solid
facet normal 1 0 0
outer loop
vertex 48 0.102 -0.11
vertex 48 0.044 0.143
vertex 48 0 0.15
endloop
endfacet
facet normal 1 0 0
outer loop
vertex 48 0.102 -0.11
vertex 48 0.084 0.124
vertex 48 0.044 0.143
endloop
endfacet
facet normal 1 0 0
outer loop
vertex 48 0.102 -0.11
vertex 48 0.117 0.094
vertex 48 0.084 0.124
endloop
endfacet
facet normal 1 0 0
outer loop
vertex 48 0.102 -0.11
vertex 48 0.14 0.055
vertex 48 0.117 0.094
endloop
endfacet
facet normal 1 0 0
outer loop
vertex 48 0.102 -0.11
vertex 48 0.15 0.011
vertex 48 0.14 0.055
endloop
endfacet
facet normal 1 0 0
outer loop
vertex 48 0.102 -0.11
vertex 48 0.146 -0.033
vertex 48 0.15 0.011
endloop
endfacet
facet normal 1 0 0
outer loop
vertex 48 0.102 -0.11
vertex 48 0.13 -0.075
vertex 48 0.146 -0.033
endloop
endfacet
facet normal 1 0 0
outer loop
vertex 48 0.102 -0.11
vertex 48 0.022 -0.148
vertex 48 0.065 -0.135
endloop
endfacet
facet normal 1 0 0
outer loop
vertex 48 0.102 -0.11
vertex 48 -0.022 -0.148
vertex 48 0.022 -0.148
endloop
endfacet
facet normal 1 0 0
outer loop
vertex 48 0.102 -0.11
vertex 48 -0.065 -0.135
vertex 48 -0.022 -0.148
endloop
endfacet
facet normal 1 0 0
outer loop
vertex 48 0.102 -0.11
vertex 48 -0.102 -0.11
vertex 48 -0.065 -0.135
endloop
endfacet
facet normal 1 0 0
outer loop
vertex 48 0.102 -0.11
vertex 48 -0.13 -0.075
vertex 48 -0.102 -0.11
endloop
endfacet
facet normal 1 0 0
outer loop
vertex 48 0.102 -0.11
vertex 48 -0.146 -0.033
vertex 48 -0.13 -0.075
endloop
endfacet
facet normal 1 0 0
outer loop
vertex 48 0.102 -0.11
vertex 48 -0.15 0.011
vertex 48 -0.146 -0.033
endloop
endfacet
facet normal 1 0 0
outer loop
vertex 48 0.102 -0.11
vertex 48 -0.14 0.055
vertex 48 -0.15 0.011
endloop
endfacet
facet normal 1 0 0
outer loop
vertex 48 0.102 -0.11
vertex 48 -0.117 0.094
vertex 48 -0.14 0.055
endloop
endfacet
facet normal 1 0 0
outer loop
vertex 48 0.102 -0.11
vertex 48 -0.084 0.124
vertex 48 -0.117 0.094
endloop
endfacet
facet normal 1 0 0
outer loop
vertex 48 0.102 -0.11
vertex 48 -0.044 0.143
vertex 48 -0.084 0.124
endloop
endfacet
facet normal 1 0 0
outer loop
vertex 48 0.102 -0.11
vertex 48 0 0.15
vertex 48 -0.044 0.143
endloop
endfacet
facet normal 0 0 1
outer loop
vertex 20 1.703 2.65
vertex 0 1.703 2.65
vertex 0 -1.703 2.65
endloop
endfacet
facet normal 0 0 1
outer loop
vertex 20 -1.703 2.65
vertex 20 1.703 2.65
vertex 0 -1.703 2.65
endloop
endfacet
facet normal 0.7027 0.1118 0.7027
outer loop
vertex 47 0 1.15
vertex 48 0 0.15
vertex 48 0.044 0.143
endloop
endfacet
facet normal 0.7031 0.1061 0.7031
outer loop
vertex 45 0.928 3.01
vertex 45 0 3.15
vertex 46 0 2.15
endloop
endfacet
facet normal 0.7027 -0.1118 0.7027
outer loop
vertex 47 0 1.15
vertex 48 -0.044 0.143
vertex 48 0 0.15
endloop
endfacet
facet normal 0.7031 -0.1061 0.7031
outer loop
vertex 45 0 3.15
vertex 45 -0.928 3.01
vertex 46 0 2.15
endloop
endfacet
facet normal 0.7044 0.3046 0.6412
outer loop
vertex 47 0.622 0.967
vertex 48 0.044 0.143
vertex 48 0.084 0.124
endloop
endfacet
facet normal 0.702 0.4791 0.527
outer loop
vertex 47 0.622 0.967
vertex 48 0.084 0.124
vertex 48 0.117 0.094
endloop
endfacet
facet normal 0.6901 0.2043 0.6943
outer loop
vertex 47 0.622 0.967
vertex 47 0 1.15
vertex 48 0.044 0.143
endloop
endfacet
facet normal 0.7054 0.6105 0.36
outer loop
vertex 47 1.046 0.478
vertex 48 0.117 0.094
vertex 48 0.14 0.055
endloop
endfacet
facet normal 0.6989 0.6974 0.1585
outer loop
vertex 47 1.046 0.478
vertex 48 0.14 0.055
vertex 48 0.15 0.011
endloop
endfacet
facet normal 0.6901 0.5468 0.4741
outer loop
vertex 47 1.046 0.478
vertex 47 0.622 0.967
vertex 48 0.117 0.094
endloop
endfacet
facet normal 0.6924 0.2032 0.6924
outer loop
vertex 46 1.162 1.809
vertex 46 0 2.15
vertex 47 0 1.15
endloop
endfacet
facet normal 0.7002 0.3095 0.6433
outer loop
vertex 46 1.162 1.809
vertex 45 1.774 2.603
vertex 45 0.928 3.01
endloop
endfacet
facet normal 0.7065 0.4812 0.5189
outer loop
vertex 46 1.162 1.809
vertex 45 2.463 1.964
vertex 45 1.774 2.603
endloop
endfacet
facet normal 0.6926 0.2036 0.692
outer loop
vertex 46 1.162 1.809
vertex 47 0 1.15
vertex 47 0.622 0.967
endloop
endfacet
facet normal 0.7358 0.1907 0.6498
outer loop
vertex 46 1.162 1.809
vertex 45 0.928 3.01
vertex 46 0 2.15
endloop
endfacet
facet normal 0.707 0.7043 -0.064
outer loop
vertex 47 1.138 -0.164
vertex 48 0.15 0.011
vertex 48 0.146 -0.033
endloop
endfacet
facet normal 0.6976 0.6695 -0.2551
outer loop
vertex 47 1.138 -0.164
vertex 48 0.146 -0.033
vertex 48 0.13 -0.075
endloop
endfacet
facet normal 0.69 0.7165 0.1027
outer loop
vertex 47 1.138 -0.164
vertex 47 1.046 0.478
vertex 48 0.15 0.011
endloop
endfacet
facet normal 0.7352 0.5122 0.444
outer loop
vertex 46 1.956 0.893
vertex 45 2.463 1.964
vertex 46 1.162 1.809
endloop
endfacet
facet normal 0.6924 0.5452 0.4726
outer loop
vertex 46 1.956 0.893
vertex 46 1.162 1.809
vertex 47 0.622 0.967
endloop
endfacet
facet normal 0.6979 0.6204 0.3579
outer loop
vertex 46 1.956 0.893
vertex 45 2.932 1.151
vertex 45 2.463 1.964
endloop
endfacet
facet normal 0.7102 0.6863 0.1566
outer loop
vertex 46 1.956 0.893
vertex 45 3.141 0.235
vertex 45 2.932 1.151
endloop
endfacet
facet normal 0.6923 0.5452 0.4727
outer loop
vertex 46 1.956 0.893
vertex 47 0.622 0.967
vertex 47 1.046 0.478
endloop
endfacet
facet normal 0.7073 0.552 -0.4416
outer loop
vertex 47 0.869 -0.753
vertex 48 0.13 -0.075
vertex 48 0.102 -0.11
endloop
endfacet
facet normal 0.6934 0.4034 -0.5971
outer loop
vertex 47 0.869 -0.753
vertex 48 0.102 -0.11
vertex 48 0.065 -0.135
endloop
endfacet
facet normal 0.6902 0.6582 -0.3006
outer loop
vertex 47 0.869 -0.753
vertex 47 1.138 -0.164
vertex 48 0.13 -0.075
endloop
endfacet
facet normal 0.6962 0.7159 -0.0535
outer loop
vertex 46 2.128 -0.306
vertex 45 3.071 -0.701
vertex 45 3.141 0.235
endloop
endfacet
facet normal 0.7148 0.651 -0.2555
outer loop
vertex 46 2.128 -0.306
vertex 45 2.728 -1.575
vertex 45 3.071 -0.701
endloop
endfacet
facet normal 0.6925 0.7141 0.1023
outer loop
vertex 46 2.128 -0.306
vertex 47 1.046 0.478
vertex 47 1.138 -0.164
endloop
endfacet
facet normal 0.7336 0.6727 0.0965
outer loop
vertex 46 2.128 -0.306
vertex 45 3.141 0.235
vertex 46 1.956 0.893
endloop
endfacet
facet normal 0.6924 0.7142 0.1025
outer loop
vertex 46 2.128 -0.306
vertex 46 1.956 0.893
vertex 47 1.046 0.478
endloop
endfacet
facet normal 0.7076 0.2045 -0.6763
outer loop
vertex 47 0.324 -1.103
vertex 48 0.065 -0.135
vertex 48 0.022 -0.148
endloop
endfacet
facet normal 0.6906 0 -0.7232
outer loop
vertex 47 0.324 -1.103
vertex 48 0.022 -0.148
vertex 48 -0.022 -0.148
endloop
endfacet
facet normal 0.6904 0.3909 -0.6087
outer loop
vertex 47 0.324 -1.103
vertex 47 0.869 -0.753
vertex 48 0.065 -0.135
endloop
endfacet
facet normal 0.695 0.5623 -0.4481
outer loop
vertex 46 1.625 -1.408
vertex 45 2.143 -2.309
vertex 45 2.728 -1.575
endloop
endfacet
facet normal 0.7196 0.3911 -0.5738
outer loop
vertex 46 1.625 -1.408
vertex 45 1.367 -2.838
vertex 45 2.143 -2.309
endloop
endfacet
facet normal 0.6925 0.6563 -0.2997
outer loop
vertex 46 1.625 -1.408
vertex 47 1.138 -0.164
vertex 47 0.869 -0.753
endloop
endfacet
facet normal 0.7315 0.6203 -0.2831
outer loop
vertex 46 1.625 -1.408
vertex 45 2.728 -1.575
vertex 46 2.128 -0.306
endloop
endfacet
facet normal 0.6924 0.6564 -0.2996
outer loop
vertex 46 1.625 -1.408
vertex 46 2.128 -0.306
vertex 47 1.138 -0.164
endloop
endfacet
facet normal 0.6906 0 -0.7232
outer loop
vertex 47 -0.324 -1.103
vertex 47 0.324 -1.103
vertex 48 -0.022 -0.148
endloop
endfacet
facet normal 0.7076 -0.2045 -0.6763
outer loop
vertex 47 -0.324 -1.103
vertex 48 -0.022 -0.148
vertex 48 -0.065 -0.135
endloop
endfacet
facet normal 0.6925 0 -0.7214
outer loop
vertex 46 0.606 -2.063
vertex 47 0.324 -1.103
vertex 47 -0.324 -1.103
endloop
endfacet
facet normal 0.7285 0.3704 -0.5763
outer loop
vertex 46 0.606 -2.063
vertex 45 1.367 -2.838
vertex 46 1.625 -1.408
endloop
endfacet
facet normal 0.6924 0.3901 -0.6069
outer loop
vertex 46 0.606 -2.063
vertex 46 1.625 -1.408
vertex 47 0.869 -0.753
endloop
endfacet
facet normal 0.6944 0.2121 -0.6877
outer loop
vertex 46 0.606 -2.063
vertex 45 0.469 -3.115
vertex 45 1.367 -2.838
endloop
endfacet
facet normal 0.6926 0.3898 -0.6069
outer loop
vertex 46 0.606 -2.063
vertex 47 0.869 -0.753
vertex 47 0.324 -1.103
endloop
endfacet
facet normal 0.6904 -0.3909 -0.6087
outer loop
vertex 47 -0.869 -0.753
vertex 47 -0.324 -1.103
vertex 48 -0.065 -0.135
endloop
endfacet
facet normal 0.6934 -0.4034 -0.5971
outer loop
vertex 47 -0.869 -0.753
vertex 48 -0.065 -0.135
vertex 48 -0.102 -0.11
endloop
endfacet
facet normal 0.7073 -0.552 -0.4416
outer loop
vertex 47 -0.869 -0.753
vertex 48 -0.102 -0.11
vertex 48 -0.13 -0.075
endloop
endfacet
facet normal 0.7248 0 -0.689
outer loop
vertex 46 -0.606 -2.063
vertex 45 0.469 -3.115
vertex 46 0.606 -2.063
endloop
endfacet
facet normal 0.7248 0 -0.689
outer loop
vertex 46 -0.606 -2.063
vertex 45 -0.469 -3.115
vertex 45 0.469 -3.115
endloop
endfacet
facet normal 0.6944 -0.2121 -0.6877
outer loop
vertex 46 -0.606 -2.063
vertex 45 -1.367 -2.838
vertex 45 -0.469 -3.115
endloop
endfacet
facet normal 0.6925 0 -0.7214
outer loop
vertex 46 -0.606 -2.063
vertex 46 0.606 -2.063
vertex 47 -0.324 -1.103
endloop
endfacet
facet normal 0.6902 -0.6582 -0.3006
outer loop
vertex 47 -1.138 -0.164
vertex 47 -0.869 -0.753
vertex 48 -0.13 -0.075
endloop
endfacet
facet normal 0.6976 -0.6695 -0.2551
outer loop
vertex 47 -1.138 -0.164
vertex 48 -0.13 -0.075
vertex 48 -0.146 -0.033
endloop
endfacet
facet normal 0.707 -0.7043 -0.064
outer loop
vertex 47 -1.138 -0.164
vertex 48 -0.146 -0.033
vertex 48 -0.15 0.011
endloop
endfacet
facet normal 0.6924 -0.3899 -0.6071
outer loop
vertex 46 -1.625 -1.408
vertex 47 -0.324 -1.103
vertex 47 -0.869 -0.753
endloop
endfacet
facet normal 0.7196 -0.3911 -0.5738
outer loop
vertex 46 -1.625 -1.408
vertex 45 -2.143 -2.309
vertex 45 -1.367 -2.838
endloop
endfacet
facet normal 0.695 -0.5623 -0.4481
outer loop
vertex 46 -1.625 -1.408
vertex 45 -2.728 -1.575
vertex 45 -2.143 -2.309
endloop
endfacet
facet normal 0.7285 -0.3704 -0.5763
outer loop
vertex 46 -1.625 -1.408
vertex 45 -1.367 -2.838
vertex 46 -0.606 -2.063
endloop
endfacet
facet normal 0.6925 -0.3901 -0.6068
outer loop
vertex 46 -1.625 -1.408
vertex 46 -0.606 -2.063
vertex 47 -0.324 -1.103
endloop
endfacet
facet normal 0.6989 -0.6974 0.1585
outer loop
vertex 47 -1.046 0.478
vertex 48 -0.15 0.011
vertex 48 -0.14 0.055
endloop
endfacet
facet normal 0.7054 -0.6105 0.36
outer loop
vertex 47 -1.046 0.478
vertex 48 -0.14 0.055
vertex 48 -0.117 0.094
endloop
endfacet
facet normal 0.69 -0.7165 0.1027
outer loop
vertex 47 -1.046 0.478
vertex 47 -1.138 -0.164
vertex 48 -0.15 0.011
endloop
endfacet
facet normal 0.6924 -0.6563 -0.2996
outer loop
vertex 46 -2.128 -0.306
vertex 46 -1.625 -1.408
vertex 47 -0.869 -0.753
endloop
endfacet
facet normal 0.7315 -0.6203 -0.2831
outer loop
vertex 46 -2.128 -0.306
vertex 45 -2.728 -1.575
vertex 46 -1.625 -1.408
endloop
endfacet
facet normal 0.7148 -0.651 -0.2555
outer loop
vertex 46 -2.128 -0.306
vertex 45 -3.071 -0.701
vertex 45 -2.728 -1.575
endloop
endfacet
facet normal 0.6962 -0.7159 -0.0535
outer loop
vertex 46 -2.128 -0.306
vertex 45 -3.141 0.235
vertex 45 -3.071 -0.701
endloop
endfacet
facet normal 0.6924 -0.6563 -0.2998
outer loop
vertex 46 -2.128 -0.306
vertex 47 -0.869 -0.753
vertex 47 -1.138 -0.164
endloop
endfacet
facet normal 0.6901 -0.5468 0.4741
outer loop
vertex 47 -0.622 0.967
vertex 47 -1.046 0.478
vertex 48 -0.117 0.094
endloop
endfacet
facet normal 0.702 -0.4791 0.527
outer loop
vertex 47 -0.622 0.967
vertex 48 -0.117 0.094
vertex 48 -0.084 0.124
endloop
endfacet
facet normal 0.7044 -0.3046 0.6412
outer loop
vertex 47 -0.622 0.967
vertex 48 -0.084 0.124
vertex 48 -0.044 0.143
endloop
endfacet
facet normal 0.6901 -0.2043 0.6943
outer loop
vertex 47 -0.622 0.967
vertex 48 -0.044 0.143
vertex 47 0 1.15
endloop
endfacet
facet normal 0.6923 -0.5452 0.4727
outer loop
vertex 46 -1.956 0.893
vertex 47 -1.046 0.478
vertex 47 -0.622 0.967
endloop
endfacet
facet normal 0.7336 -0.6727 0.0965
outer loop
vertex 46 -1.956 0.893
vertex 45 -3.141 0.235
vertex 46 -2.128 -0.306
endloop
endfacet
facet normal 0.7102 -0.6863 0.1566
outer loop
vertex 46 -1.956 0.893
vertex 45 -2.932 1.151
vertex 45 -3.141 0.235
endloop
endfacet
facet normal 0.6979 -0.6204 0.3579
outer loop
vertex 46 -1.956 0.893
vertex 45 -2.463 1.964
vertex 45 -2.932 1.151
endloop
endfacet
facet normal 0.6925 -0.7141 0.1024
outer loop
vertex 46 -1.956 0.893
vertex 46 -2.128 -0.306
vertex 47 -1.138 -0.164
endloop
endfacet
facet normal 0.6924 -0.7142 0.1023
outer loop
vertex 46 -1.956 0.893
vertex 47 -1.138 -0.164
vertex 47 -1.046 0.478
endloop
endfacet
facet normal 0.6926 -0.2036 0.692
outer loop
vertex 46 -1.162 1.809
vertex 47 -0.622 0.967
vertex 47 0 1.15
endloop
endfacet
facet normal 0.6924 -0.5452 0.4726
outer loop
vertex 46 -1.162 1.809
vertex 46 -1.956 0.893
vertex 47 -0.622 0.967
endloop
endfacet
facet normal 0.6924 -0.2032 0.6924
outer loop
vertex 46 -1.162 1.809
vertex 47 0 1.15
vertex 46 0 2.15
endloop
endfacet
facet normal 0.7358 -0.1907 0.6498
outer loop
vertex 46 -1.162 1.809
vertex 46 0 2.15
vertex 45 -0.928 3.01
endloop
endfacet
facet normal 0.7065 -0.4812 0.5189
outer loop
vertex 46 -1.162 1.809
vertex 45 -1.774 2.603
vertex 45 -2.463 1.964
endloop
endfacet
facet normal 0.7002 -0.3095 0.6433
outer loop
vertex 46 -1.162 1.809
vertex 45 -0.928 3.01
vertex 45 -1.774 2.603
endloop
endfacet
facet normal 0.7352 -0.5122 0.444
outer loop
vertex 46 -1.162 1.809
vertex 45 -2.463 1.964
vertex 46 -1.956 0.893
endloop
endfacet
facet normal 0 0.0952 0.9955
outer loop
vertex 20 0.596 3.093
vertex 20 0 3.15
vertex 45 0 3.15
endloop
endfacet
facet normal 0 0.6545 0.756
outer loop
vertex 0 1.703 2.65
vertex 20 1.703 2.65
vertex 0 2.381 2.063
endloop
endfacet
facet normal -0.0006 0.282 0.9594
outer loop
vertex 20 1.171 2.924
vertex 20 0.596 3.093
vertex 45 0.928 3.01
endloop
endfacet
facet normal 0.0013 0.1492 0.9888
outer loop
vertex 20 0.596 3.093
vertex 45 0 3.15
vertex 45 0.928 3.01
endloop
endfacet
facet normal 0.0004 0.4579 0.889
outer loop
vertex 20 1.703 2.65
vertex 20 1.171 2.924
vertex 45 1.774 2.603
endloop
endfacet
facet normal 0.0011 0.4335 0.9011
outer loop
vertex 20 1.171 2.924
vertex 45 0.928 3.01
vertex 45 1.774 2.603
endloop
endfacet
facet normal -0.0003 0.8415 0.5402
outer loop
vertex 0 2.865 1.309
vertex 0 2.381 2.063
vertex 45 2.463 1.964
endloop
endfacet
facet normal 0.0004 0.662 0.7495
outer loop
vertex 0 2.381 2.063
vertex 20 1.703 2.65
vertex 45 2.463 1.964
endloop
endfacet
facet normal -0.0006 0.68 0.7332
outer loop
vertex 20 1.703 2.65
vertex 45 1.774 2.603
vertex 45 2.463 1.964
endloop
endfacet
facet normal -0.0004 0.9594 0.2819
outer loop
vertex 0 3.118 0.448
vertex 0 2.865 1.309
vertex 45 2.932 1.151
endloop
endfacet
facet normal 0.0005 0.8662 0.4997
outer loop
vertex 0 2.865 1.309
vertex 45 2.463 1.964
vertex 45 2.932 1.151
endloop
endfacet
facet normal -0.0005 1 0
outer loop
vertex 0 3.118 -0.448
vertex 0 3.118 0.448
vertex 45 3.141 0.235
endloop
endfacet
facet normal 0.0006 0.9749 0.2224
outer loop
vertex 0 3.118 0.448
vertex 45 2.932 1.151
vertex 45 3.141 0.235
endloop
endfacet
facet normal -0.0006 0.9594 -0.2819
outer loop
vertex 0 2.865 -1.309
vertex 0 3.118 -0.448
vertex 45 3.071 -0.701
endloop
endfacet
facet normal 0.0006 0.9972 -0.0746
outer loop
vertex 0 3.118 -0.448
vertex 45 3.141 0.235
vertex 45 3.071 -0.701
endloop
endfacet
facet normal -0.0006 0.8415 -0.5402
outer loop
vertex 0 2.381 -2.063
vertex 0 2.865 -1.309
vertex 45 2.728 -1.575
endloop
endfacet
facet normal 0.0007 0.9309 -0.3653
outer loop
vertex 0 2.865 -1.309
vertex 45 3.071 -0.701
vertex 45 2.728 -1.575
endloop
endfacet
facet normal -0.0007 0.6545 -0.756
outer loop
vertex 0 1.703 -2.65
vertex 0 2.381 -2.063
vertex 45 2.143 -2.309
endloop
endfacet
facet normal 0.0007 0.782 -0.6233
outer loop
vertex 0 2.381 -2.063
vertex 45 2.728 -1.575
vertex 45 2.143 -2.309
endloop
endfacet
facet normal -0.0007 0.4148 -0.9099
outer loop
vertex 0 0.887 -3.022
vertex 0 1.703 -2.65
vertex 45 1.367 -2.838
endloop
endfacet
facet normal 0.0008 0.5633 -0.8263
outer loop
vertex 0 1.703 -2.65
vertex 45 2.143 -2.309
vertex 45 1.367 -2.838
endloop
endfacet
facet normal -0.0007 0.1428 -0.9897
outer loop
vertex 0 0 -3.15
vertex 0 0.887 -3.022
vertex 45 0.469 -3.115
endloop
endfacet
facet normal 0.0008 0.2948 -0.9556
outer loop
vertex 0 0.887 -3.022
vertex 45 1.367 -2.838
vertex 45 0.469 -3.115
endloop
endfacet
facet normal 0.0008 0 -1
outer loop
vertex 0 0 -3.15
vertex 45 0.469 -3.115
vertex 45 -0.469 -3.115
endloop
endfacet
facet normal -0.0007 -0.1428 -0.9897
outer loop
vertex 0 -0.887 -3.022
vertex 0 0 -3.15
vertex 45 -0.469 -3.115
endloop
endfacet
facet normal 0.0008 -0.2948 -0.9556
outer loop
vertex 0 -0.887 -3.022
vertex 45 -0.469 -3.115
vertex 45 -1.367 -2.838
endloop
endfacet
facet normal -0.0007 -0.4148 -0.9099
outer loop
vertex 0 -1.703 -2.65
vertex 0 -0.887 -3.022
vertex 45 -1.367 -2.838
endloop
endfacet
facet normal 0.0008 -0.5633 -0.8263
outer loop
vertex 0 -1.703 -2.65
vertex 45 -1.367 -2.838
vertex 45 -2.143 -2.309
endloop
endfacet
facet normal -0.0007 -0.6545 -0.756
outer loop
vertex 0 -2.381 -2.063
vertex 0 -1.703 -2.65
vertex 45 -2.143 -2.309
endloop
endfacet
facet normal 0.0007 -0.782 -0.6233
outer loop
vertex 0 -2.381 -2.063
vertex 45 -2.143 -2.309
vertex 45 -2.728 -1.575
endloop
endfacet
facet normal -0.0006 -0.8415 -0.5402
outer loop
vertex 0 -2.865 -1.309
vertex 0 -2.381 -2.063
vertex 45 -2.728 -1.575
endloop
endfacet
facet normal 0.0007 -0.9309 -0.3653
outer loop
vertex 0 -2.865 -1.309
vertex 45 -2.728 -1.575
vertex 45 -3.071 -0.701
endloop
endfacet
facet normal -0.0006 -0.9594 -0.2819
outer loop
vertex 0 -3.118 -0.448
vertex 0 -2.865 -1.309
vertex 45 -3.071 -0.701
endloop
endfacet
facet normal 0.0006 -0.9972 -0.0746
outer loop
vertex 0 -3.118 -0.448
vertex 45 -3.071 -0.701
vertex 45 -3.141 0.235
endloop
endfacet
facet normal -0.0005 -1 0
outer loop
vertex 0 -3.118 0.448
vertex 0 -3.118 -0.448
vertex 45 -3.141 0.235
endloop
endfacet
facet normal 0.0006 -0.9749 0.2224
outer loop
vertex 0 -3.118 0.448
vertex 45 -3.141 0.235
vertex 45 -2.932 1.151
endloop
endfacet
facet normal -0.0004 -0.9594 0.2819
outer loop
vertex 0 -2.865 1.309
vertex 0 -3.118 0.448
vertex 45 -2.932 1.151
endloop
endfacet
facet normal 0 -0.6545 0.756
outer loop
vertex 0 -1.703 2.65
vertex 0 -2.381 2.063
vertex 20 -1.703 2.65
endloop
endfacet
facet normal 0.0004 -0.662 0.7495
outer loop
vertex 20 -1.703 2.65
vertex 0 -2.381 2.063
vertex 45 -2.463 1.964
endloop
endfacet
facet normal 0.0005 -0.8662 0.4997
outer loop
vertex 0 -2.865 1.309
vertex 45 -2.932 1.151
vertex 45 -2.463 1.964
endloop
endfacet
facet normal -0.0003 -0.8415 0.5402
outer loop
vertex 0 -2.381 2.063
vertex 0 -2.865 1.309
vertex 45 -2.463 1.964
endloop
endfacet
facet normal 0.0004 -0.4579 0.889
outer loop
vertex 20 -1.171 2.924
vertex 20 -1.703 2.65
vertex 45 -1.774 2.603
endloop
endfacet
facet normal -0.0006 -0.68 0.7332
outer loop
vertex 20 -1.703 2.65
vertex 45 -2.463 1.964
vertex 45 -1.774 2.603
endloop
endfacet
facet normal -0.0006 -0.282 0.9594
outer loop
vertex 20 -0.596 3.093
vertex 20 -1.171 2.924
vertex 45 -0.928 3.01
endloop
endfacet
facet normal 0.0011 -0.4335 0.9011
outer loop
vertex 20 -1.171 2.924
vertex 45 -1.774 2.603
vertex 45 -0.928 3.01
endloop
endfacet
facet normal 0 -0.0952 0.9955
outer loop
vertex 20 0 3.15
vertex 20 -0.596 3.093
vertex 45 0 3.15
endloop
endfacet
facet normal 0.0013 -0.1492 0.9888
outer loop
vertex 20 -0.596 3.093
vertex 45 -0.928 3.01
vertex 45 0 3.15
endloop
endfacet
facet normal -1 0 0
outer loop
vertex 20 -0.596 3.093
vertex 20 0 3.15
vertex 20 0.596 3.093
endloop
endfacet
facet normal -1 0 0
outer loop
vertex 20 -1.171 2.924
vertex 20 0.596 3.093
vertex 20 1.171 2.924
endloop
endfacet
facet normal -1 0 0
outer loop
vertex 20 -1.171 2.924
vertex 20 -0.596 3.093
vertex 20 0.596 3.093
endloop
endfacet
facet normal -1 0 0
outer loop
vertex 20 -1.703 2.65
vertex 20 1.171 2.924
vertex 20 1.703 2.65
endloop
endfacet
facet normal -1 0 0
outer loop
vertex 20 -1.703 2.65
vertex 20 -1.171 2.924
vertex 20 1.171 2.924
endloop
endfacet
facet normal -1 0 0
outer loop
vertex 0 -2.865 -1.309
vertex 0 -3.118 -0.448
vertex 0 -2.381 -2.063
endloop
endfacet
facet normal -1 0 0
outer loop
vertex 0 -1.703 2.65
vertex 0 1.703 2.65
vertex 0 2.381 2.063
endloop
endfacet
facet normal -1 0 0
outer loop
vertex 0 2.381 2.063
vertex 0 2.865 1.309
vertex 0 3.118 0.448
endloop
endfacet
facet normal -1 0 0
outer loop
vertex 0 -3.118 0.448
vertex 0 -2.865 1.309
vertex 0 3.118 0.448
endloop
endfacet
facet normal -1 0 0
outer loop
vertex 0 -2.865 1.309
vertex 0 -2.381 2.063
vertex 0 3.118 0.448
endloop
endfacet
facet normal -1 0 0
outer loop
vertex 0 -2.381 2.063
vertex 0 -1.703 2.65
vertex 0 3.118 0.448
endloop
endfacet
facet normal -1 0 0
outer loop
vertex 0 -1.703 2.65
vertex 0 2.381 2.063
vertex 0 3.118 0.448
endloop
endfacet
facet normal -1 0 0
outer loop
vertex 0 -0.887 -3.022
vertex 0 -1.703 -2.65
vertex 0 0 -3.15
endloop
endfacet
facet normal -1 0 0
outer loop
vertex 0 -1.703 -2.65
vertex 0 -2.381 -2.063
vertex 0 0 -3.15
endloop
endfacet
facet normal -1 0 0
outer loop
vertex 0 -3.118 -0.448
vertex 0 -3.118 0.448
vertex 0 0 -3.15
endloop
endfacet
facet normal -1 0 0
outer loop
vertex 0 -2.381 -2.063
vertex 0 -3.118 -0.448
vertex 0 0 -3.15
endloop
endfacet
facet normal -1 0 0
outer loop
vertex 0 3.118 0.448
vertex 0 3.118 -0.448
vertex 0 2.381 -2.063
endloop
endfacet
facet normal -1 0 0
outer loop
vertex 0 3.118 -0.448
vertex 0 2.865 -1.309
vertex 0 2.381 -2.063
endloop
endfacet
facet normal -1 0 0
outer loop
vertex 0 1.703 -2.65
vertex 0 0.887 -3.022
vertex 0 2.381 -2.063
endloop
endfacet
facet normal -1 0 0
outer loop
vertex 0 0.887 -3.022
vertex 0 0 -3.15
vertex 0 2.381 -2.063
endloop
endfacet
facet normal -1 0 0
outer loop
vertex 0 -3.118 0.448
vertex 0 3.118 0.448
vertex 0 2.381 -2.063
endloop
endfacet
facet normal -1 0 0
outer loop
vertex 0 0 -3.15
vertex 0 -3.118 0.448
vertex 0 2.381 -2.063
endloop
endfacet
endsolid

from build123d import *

# Parameters (mm, degrees)
F0_W     = 48
F0_H     = 3.15
F2_SIZE  = 3
F4_DEPTH = 20


with BuildPart() as f1:
    # F0 (on Front) → F1 (revolve)
    with BuildSketch(Plane.XZ):
        with Locations((24, 1.575)):
            Rectangle(F0_W, F0_H)
    revolve(axis=Axis((24, 0, 0), (-1, 0, 0)))

    # F2
    f2_edges = [f1.edges().sort_by_distance(p)[0] for p in [
        (48, 0, -3.15),
    ]]
    chamfer(f2_edges, length=F2_SIZE)

    # F3 (on face) → F4 (cut)
    with BuildSketch(Plane(origin=(0, 0, 0), x_dir=(0, -1, 0), z_dir=(-1, 0, 0))):
        with BuildLine():
            Line((-1.7029386366, 2.65), (1.7029386366, 2.65))
            ThreePointArc((1.7029386366, 2.65), (0.8874119675, 3.0224162519), (0, 3.15))
            ThreePointArc((0, 3.15), (-0.8874119675, 3.0224162519), (-1.7029386366, 2.65))
        make_face()
    extrude(amount=-F4_DEPTH, mode=Mode.SUBTRACT)


solid = f1.part
